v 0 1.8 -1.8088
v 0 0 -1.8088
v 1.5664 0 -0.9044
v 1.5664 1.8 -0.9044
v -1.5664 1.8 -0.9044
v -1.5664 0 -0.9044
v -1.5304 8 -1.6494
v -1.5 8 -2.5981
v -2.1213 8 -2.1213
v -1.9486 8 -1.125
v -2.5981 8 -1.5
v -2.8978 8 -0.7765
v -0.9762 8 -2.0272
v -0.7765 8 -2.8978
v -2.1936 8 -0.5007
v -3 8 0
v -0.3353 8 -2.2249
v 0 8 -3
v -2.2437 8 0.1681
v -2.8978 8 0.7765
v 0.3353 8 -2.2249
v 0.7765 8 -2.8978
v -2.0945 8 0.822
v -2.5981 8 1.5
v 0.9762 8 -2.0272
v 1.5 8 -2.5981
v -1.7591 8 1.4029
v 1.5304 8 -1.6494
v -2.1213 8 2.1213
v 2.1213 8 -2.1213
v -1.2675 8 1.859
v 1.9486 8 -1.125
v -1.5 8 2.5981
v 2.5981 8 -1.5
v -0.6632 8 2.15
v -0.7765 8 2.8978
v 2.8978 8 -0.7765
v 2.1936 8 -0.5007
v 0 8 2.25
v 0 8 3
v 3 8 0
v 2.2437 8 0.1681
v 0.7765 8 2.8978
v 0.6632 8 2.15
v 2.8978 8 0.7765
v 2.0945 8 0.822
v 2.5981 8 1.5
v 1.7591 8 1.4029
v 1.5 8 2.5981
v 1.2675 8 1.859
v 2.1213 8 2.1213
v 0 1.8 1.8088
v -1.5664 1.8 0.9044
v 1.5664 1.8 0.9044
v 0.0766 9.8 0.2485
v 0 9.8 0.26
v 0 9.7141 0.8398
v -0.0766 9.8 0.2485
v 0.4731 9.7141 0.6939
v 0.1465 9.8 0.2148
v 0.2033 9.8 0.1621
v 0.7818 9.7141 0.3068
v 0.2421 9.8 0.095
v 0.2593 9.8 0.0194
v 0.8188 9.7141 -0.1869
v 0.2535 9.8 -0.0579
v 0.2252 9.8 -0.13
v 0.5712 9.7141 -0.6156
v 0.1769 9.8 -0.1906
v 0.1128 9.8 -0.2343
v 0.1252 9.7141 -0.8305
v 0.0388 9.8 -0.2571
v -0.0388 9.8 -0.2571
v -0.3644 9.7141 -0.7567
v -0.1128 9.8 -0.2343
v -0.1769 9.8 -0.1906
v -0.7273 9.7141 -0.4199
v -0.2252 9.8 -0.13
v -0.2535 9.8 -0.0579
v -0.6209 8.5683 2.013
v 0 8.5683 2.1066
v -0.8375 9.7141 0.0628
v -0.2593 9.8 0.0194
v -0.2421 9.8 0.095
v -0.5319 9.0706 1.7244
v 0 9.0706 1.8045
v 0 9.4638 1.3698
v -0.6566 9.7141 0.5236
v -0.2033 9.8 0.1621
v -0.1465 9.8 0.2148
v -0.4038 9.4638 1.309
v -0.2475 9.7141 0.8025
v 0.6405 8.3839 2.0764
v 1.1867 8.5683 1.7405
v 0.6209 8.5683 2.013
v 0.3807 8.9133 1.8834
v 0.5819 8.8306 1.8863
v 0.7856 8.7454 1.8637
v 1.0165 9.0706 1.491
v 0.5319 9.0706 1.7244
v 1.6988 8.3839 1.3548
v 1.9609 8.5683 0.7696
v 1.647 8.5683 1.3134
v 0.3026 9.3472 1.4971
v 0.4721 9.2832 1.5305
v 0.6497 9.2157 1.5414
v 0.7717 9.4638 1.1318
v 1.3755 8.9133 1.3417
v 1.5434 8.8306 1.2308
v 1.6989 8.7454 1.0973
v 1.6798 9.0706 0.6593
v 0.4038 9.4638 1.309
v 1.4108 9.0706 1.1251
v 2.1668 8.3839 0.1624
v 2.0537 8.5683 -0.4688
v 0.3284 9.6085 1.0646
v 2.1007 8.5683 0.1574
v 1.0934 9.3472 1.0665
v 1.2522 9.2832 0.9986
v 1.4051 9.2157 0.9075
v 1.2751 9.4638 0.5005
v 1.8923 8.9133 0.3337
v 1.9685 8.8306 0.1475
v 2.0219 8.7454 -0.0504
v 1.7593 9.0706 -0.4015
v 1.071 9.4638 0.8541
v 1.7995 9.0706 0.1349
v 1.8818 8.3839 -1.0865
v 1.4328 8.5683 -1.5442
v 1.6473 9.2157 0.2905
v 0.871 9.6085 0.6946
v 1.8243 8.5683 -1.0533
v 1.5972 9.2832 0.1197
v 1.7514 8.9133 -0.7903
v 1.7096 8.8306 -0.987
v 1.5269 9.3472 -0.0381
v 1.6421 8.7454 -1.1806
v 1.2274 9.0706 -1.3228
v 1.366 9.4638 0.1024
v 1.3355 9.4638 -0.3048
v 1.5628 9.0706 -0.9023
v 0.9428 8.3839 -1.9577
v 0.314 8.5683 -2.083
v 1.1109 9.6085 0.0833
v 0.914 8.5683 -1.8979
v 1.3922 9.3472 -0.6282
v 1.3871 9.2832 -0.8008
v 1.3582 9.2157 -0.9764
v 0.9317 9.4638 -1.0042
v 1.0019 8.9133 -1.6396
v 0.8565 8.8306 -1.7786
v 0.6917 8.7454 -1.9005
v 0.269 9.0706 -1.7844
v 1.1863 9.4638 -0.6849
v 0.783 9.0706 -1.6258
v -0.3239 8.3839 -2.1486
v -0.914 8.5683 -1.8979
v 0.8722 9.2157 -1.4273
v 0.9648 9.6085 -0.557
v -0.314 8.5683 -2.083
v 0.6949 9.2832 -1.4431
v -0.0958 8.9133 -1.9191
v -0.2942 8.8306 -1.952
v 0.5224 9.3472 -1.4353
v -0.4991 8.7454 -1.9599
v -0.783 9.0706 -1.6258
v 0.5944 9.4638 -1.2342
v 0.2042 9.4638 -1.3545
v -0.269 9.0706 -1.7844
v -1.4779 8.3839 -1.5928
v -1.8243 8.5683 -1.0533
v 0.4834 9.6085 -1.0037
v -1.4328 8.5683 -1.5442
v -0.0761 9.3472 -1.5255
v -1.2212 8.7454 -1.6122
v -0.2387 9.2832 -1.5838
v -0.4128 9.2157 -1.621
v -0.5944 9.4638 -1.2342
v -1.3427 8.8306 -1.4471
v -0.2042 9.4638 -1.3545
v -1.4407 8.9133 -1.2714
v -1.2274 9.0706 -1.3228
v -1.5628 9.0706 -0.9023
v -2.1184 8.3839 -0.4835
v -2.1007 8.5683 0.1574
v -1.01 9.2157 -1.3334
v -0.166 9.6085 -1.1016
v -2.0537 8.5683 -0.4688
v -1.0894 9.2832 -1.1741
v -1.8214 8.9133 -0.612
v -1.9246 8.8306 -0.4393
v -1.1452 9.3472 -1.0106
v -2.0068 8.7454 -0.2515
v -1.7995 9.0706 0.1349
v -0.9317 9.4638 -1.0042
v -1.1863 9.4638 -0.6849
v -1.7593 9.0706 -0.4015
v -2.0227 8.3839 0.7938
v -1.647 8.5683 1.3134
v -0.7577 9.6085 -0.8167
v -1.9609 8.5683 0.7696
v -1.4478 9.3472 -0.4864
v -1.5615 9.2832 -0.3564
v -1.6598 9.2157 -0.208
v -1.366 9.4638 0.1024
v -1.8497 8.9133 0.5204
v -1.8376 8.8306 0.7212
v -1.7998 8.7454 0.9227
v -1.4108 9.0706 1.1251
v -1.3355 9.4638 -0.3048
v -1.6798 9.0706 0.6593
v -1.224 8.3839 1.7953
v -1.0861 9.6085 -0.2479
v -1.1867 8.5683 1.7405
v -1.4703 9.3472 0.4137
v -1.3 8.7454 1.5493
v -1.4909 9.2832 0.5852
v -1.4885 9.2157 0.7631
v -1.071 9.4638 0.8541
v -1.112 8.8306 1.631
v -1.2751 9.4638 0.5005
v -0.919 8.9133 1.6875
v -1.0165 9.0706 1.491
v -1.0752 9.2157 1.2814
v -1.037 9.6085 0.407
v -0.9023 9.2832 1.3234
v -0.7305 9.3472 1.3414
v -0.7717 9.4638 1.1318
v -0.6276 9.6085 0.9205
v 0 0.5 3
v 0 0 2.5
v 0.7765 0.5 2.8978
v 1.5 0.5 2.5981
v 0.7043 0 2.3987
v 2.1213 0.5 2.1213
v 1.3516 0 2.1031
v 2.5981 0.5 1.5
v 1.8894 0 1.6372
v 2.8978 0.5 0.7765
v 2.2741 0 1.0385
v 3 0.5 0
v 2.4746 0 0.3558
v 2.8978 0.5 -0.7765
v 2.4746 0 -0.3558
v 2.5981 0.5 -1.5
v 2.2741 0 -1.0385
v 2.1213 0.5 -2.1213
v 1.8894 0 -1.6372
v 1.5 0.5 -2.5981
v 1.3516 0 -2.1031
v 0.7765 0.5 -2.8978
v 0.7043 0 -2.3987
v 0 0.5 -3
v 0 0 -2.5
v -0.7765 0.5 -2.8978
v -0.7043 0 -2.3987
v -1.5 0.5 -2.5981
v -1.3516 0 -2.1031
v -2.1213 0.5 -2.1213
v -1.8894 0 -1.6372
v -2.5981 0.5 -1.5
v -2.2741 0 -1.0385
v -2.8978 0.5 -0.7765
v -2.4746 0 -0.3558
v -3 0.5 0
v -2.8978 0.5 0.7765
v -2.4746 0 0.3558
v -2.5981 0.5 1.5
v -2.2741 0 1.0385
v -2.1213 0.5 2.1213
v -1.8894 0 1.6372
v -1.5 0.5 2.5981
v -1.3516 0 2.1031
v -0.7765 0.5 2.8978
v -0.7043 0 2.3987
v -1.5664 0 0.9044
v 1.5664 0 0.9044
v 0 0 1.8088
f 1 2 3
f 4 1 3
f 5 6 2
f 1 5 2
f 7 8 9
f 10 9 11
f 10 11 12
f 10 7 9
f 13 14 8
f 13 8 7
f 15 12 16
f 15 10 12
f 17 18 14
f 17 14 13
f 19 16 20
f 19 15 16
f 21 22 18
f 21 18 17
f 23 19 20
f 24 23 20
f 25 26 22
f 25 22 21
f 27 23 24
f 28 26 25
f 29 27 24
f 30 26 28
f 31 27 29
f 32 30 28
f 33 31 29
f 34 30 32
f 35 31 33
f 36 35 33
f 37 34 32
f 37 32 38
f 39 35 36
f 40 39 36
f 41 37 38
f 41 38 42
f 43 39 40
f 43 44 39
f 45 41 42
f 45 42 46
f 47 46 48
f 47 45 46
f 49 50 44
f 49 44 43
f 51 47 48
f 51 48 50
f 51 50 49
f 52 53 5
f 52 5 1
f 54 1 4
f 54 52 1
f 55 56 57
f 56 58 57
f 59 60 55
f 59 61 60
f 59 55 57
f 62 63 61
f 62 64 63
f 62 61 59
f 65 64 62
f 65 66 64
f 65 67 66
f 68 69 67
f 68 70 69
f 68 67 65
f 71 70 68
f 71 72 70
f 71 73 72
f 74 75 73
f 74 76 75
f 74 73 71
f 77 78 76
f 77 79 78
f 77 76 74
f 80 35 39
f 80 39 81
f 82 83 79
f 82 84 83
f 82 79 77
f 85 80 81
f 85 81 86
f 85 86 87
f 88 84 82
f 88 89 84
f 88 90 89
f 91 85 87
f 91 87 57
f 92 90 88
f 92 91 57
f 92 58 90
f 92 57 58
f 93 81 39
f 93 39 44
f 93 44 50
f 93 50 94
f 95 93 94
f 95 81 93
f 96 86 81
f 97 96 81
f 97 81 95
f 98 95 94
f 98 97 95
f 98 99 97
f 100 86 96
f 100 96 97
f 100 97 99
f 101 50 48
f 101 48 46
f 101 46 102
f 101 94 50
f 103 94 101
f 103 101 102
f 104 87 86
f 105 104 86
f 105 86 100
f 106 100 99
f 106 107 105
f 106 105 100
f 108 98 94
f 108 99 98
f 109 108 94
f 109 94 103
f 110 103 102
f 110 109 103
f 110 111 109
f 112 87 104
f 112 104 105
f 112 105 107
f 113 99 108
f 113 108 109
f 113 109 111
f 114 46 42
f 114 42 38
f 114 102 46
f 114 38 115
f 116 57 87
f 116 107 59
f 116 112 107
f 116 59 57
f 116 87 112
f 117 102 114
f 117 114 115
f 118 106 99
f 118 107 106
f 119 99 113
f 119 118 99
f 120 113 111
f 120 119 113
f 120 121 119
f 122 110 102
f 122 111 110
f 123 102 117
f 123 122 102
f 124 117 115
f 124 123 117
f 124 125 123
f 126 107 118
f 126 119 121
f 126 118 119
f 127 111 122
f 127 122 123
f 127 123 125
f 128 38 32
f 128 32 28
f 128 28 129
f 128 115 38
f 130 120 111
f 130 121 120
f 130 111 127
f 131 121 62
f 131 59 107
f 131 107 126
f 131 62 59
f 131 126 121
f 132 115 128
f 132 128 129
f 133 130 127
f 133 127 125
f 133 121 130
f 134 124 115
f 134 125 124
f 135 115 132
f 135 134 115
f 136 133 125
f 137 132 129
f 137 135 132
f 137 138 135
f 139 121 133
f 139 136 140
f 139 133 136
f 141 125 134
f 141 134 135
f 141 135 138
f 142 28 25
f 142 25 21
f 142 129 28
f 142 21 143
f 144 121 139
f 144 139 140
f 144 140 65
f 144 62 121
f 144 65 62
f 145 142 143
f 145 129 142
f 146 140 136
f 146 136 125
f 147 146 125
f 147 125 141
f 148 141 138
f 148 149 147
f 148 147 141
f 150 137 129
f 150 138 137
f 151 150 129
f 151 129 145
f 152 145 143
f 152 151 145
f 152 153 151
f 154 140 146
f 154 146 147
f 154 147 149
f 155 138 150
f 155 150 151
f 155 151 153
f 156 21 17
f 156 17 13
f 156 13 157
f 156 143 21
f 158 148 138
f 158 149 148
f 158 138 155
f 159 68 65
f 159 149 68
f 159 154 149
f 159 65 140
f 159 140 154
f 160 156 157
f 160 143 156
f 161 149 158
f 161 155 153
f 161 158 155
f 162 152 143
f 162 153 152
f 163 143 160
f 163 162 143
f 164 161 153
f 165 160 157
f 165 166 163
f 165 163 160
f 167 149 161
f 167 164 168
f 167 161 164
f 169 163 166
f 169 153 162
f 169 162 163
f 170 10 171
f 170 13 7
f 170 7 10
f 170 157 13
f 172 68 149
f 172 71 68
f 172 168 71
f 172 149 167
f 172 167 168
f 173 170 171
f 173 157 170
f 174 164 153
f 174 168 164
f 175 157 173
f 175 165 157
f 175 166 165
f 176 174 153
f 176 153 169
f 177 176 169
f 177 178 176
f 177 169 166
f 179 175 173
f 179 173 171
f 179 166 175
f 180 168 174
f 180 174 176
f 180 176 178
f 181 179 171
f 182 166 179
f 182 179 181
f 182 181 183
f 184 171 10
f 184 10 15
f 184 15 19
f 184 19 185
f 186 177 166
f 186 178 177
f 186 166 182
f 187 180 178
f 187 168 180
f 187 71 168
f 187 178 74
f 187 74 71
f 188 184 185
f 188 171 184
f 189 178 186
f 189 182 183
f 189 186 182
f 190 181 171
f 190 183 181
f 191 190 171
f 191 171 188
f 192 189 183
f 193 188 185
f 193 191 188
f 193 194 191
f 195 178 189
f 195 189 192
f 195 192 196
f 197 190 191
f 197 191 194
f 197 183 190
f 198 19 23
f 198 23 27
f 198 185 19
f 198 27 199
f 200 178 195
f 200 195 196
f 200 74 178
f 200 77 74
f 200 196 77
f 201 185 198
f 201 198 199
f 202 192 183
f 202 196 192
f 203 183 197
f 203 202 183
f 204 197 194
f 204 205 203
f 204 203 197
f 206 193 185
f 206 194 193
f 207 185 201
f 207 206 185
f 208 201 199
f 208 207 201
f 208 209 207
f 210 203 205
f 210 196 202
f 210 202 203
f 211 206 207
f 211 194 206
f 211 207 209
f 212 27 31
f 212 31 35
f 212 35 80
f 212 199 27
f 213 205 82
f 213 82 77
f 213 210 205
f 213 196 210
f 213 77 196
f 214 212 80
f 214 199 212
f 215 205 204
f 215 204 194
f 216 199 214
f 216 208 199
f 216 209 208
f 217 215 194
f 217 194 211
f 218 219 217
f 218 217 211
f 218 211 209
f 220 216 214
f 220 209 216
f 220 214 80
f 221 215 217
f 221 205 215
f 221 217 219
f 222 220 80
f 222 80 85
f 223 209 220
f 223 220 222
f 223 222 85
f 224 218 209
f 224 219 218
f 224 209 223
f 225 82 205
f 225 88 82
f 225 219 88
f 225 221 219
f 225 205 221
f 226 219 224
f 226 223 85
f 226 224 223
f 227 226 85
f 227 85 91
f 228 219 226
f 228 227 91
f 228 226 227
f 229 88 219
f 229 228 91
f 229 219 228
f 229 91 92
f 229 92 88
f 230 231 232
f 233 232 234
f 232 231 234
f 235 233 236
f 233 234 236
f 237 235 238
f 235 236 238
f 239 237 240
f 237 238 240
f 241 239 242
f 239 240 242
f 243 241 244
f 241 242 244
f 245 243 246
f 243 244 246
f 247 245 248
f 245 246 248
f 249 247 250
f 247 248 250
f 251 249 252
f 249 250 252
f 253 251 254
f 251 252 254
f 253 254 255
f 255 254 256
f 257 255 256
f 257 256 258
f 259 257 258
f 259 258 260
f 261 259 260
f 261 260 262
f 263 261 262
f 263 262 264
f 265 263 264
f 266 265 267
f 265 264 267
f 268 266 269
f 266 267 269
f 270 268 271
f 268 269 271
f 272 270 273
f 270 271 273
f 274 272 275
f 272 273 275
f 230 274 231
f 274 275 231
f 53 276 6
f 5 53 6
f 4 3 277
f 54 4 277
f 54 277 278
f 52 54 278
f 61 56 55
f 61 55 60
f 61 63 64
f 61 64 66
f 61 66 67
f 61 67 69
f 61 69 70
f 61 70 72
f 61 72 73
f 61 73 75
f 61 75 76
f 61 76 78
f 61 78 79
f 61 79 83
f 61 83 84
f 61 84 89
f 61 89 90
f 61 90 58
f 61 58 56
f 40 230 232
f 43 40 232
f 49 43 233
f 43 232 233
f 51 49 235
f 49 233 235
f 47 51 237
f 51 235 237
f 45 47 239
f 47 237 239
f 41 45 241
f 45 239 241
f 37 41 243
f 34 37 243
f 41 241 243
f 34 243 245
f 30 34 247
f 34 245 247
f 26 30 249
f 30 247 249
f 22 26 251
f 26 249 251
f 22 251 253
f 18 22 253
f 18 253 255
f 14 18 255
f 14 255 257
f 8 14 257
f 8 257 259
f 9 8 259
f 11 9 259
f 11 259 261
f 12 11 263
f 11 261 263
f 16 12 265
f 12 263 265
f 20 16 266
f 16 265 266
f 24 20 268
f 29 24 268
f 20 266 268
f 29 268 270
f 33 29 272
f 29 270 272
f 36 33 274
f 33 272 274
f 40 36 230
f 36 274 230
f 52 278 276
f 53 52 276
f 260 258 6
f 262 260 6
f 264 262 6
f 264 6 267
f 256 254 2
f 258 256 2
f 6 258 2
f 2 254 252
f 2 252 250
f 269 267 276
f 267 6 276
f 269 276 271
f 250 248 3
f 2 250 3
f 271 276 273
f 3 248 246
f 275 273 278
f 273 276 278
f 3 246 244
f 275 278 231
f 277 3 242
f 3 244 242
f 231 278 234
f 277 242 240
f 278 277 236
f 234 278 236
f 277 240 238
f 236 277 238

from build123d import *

# Parameters (mm, degrees)
SKETCH_1_R          = 3
EXTRUDE_1_DEPTH     = 8
SKETCH_2_R          = 2.25
EXTRUDE_2_DEPTH     = 1.8
FILLET_2_R          = 2
CHAMFER_1_SIZE      = 0.5
CUT_EXTRUDE_1_DEPTH = 1.8


with BuildPart() as part:
    # 草图1 → 凸台-拉伸1 (new body)
    with BuildSketch(Plane(origin=(0, 0, 0), x_dir=(1, 0, 0), z_dir=(0, 1, 0))):
        with Locations(Location((0, 0, 0), (0, 0, 270))):
            Circle(SKETCH_1_R)
    extrude(amount=EXTRUDE_1_DEPTH)

    # 草图2 → 凸台-拉伸2 (add)
    with BuildSketch(Plane(origin=(0, 8, 0), x_dir=(1, 0, 0), z_dir=(0, 1, 0))):
        with Locations(Location((0, 0, 0), (0, 0, 270))):
            Circle(SKETCH_2_R)
    extrude(amount=EXTRUDE_2_DEPTH)

    # 圆角2
    # the kernel refuses this fillet: 2 mm, written as the material it takes off along each edge
    with BuildSketch(Plane(origin=(0, 9.8, 0), x_dir=(0, 0, 1), z_dir=(-1, 0, 0))) as fillet_2_piece_1:
        with BuildLine():
            CenterArc((0.260025126, -2), FILLET_2_R, 5.739170477, 84.260829523)
            Line((0.260025126, 0), (0.260025126, 0.04))
            Line((0.260025126, 0.04), (2.25, 0.04))
            Line((2.25, 0.04), (2.29, 0))
            ThreePointArc((2.29, 0), (2.29, -0.9), (2.289799497, -1.796))
            Line((2.289799497, -1.796), (2.25, -1.8))
        make_face()
    revolve(axis=Axis((0, 9.8, 0), (0, 1, 0)), mode=Mode.SUBTRACT)

    # 倒角1
    chamfer_1_edges = [part.edges().sort_by_distance(p)[0] for p in [
        (0, 0, -3),
    ]]
    chamfer(chamfer_1_edges, length=CHAMFER_1_SIZE)

    # 草图3 → 切除-拉伸1 (cut)
    with BuildSketch(Plane.XZ):
        Polygon((0, 1.808769012), (-1.566439914, 0.904384506), (-1.566439914, -0.904384506), (0, -1.808769012), (1.566439914, -0.904384506), (1.566439914, 0.904384506), align=None)
    extrude(amount=-CUT_EXTRUDE_1_DEPTH, mode=Mode.SUBTRACT)


solid = part.part
